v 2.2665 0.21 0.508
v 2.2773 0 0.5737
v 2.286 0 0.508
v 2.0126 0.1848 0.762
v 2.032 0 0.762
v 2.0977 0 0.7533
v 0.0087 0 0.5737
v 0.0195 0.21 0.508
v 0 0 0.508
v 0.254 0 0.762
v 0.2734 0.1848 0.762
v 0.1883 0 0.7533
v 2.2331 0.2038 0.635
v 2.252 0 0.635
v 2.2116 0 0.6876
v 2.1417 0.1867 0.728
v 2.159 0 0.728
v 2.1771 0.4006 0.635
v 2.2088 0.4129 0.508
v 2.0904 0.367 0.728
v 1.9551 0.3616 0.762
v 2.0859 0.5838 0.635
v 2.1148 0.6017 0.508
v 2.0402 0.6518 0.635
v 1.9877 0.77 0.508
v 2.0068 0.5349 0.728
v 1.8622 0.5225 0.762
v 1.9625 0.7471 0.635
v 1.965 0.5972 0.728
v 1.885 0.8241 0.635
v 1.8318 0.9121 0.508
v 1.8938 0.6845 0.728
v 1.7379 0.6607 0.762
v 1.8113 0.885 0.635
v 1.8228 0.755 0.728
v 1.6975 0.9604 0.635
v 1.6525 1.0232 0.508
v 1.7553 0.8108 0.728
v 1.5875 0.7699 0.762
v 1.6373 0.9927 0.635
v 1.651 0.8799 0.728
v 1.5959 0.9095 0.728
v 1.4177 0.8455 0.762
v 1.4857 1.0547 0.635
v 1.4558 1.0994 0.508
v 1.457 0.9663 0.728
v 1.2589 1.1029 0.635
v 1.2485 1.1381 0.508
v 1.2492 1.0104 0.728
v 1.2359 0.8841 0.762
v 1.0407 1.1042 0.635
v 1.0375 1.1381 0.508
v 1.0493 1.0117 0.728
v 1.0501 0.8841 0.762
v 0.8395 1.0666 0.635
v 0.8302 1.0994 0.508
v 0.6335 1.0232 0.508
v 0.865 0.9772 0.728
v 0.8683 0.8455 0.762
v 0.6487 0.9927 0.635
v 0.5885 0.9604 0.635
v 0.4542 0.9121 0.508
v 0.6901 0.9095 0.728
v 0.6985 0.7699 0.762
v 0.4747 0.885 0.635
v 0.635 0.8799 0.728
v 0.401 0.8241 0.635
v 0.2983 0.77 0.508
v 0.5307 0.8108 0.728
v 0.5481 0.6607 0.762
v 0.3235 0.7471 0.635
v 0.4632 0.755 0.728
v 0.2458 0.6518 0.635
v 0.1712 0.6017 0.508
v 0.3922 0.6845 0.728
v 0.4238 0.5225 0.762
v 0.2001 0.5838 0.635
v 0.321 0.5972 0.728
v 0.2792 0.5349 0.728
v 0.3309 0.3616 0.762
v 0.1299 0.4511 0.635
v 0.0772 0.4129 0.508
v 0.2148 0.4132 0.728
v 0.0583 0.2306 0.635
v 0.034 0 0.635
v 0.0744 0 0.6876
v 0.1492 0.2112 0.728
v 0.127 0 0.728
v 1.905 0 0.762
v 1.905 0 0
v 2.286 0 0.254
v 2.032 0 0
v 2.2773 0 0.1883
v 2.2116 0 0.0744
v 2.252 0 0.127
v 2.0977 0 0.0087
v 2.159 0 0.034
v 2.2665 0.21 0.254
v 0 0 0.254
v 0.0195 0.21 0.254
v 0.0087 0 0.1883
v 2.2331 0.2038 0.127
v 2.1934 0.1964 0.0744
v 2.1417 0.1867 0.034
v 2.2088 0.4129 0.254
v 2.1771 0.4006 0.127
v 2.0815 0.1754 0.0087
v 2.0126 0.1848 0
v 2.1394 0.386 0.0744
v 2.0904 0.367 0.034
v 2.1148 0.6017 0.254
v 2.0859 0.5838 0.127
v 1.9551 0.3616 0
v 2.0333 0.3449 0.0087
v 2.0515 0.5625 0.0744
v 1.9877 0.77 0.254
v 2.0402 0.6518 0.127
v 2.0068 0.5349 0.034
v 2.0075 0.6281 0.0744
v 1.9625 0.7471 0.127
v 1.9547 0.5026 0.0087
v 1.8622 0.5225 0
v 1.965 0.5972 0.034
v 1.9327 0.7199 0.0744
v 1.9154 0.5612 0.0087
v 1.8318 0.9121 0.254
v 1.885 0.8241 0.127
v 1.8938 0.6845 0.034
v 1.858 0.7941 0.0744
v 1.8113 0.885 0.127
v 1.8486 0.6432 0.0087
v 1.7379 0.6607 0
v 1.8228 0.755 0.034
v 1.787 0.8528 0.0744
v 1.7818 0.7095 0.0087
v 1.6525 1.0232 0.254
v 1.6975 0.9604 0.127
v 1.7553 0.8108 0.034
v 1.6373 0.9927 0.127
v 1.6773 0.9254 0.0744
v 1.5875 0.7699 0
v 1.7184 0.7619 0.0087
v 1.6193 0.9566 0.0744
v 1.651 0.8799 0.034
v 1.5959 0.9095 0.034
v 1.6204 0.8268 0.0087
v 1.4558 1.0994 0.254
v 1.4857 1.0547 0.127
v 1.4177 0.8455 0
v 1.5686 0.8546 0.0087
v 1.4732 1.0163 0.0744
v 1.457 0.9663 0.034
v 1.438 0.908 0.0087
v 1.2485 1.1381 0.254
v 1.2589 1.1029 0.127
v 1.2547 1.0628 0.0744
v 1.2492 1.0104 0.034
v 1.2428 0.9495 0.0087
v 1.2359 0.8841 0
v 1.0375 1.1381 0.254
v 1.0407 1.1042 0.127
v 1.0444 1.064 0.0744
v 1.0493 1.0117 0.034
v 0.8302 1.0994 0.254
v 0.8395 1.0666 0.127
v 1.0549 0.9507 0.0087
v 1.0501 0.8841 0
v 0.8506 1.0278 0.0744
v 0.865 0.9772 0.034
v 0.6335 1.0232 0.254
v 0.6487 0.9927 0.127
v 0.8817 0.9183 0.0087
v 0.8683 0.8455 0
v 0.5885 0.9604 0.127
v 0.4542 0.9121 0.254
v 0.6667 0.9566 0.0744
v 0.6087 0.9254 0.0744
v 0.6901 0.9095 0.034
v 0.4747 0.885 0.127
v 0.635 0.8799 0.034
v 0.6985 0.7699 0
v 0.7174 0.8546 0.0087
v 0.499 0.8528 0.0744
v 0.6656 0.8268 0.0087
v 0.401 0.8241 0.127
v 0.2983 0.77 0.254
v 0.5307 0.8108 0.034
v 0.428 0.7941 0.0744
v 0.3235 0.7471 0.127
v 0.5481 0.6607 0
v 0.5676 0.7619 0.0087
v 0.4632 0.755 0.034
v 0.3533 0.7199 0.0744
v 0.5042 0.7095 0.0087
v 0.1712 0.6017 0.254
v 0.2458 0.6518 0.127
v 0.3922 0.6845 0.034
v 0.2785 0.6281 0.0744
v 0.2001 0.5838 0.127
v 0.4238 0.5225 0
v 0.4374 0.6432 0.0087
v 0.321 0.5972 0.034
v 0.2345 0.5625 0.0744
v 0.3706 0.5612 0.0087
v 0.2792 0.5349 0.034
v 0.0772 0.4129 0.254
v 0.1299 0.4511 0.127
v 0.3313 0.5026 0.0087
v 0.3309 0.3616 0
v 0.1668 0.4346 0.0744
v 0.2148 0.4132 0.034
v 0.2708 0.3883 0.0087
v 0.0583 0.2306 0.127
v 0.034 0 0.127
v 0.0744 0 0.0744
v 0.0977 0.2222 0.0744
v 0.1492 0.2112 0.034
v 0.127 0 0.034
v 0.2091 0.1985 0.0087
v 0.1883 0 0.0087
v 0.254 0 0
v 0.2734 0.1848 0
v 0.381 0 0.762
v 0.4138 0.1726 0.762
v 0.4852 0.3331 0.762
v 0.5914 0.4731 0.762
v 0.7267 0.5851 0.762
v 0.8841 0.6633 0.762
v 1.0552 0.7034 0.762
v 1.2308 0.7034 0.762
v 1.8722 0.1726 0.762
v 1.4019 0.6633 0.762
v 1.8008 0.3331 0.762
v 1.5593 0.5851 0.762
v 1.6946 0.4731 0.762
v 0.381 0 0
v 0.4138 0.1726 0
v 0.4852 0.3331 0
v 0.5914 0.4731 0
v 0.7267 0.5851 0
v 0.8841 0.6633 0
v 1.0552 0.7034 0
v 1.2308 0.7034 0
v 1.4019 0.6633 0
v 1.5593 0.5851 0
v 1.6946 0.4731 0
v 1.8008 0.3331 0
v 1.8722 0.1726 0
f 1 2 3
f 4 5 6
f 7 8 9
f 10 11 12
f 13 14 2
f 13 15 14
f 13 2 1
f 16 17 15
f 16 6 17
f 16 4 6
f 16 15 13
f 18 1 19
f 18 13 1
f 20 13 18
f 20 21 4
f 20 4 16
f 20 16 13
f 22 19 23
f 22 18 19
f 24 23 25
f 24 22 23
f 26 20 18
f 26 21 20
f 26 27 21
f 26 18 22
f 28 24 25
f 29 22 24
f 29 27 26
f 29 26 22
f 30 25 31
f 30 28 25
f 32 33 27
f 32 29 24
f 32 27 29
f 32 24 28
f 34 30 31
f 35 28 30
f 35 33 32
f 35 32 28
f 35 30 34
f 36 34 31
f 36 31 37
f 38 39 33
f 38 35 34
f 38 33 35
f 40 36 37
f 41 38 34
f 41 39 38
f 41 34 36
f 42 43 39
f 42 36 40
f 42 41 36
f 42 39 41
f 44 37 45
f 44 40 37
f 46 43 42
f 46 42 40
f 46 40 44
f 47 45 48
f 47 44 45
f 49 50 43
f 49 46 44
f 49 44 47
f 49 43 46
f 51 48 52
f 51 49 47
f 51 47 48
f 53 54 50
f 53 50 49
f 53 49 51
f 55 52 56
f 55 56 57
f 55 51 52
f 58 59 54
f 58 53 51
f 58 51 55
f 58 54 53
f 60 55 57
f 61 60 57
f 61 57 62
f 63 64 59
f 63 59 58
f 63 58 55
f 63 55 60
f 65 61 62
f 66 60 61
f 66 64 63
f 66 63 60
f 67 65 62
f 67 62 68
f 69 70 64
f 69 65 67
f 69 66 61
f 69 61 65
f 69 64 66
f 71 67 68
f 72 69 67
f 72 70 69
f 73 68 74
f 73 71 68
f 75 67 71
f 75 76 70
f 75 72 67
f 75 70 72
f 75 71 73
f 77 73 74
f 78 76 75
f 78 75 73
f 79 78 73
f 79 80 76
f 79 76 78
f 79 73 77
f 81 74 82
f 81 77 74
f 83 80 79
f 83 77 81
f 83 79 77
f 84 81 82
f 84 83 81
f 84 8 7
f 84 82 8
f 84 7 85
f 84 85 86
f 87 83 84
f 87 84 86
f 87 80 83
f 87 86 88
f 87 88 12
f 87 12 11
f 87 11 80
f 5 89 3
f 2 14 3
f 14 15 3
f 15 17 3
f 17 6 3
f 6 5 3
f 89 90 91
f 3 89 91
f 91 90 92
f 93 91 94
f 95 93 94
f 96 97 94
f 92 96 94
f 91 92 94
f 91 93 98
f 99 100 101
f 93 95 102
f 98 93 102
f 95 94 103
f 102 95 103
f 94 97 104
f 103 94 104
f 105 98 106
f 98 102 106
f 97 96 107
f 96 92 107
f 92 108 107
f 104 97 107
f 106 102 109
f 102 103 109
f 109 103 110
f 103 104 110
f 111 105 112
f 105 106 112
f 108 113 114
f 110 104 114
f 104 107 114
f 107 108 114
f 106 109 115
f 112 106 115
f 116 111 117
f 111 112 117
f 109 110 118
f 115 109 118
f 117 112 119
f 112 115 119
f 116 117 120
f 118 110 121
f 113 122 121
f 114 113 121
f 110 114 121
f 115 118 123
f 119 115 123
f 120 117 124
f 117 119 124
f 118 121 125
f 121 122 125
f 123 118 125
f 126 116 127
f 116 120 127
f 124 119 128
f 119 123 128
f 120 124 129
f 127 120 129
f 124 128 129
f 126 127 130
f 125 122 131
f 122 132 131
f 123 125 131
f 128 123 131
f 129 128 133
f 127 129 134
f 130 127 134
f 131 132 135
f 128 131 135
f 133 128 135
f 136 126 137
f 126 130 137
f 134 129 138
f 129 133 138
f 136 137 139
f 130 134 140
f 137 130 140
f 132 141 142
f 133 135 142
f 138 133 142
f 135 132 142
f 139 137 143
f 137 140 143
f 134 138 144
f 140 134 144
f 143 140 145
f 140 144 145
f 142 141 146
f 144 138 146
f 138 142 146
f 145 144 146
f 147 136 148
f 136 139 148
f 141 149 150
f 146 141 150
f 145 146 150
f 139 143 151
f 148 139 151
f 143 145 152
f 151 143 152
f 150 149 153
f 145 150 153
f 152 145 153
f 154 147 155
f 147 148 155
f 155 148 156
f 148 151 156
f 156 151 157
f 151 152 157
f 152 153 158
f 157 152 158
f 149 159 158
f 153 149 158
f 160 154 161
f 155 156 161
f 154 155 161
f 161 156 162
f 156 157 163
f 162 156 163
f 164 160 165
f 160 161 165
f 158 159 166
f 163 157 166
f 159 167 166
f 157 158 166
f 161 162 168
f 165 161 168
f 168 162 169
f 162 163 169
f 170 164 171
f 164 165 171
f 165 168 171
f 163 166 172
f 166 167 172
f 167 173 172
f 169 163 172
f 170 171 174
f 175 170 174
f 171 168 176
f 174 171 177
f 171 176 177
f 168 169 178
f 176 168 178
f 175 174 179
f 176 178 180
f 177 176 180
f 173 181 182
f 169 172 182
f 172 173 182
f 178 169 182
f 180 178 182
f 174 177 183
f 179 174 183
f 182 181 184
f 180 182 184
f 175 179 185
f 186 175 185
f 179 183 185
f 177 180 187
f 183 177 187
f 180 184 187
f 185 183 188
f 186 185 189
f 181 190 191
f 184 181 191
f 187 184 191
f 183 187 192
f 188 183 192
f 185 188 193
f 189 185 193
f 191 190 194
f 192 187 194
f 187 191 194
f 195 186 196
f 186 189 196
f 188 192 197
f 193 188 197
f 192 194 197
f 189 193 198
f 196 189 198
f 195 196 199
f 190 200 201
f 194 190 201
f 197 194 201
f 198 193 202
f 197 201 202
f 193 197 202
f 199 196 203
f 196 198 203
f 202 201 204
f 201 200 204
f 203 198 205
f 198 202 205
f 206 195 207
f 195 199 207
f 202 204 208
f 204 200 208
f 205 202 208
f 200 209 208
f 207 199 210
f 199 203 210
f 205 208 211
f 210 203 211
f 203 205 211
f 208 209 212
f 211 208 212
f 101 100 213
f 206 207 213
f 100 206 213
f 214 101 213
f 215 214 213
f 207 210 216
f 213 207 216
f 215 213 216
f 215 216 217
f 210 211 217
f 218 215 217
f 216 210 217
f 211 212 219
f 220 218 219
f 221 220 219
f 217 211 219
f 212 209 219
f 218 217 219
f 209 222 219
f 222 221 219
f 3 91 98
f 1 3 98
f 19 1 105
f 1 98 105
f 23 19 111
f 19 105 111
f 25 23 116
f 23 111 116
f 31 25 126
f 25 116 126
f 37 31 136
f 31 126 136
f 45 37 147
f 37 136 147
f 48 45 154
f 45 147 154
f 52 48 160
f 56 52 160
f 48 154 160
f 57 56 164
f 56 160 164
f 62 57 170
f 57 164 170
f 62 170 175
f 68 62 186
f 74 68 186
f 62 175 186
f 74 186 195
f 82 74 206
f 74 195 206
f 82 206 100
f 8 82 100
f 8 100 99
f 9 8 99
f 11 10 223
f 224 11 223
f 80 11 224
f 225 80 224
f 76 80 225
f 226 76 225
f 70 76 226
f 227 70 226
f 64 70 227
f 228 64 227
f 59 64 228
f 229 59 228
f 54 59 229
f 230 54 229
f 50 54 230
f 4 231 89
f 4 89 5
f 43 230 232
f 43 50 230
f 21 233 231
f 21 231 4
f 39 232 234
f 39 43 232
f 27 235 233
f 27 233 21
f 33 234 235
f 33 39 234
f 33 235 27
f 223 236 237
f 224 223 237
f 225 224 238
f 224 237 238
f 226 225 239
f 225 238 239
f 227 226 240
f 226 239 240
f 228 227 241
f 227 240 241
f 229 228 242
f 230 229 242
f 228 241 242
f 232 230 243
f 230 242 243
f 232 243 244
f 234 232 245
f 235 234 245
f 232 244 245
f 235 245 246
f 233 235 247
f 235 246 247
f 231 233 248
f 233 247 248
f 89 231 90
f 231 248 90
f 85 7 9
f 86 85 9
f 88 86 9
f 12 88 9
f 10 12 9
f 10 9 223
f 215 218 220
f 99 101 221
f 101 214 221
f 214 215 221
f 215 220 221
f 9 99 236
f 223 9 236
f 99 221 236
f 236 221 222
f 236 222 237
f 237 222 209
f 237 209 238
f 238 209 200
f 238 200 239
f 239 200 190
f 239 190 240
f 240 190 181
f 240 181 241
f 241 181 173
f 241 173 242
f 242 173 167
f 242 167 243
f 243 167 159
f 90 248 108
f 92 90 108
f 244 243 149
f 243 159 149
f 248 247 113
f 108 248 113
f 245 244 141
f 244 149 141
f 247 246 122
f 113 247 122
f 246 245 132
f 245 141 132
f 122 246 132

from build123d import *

# Parameters (mm, degrees)
BOSS_EXTRUDE1_DEPTH = 0.762
FILLET1_R           = 0.254


with BuildPart() as part:
    # Sketch1 → Boss-Extrude1 (new body)
    with BuildSketch(Plane.XY):
        with BuildLine():
            Line((0, 0), (0.381, 0))
            ThreePointArc((0.381, 0), (1.143, 0.708483622), (1.905, 0))
            Line((1.905, 0), (2.286, 0))
            ThreePointArc((2.286, 0), (1.143, 1.143), (0, 0))
        make_face()
    extrude(amount=BOSS_EXTRUDE1_DEPTH)

    # Fillet1
    fillet1_edges = [part.edges().sort_by_distance(p)[0] for p in [
        (1.143, 1.143, 0.762),
        (1.143, 1.143, 0),
    ]]
    fillet(fillet1_edges, radius=FILLET1_R)


solid = part.part
